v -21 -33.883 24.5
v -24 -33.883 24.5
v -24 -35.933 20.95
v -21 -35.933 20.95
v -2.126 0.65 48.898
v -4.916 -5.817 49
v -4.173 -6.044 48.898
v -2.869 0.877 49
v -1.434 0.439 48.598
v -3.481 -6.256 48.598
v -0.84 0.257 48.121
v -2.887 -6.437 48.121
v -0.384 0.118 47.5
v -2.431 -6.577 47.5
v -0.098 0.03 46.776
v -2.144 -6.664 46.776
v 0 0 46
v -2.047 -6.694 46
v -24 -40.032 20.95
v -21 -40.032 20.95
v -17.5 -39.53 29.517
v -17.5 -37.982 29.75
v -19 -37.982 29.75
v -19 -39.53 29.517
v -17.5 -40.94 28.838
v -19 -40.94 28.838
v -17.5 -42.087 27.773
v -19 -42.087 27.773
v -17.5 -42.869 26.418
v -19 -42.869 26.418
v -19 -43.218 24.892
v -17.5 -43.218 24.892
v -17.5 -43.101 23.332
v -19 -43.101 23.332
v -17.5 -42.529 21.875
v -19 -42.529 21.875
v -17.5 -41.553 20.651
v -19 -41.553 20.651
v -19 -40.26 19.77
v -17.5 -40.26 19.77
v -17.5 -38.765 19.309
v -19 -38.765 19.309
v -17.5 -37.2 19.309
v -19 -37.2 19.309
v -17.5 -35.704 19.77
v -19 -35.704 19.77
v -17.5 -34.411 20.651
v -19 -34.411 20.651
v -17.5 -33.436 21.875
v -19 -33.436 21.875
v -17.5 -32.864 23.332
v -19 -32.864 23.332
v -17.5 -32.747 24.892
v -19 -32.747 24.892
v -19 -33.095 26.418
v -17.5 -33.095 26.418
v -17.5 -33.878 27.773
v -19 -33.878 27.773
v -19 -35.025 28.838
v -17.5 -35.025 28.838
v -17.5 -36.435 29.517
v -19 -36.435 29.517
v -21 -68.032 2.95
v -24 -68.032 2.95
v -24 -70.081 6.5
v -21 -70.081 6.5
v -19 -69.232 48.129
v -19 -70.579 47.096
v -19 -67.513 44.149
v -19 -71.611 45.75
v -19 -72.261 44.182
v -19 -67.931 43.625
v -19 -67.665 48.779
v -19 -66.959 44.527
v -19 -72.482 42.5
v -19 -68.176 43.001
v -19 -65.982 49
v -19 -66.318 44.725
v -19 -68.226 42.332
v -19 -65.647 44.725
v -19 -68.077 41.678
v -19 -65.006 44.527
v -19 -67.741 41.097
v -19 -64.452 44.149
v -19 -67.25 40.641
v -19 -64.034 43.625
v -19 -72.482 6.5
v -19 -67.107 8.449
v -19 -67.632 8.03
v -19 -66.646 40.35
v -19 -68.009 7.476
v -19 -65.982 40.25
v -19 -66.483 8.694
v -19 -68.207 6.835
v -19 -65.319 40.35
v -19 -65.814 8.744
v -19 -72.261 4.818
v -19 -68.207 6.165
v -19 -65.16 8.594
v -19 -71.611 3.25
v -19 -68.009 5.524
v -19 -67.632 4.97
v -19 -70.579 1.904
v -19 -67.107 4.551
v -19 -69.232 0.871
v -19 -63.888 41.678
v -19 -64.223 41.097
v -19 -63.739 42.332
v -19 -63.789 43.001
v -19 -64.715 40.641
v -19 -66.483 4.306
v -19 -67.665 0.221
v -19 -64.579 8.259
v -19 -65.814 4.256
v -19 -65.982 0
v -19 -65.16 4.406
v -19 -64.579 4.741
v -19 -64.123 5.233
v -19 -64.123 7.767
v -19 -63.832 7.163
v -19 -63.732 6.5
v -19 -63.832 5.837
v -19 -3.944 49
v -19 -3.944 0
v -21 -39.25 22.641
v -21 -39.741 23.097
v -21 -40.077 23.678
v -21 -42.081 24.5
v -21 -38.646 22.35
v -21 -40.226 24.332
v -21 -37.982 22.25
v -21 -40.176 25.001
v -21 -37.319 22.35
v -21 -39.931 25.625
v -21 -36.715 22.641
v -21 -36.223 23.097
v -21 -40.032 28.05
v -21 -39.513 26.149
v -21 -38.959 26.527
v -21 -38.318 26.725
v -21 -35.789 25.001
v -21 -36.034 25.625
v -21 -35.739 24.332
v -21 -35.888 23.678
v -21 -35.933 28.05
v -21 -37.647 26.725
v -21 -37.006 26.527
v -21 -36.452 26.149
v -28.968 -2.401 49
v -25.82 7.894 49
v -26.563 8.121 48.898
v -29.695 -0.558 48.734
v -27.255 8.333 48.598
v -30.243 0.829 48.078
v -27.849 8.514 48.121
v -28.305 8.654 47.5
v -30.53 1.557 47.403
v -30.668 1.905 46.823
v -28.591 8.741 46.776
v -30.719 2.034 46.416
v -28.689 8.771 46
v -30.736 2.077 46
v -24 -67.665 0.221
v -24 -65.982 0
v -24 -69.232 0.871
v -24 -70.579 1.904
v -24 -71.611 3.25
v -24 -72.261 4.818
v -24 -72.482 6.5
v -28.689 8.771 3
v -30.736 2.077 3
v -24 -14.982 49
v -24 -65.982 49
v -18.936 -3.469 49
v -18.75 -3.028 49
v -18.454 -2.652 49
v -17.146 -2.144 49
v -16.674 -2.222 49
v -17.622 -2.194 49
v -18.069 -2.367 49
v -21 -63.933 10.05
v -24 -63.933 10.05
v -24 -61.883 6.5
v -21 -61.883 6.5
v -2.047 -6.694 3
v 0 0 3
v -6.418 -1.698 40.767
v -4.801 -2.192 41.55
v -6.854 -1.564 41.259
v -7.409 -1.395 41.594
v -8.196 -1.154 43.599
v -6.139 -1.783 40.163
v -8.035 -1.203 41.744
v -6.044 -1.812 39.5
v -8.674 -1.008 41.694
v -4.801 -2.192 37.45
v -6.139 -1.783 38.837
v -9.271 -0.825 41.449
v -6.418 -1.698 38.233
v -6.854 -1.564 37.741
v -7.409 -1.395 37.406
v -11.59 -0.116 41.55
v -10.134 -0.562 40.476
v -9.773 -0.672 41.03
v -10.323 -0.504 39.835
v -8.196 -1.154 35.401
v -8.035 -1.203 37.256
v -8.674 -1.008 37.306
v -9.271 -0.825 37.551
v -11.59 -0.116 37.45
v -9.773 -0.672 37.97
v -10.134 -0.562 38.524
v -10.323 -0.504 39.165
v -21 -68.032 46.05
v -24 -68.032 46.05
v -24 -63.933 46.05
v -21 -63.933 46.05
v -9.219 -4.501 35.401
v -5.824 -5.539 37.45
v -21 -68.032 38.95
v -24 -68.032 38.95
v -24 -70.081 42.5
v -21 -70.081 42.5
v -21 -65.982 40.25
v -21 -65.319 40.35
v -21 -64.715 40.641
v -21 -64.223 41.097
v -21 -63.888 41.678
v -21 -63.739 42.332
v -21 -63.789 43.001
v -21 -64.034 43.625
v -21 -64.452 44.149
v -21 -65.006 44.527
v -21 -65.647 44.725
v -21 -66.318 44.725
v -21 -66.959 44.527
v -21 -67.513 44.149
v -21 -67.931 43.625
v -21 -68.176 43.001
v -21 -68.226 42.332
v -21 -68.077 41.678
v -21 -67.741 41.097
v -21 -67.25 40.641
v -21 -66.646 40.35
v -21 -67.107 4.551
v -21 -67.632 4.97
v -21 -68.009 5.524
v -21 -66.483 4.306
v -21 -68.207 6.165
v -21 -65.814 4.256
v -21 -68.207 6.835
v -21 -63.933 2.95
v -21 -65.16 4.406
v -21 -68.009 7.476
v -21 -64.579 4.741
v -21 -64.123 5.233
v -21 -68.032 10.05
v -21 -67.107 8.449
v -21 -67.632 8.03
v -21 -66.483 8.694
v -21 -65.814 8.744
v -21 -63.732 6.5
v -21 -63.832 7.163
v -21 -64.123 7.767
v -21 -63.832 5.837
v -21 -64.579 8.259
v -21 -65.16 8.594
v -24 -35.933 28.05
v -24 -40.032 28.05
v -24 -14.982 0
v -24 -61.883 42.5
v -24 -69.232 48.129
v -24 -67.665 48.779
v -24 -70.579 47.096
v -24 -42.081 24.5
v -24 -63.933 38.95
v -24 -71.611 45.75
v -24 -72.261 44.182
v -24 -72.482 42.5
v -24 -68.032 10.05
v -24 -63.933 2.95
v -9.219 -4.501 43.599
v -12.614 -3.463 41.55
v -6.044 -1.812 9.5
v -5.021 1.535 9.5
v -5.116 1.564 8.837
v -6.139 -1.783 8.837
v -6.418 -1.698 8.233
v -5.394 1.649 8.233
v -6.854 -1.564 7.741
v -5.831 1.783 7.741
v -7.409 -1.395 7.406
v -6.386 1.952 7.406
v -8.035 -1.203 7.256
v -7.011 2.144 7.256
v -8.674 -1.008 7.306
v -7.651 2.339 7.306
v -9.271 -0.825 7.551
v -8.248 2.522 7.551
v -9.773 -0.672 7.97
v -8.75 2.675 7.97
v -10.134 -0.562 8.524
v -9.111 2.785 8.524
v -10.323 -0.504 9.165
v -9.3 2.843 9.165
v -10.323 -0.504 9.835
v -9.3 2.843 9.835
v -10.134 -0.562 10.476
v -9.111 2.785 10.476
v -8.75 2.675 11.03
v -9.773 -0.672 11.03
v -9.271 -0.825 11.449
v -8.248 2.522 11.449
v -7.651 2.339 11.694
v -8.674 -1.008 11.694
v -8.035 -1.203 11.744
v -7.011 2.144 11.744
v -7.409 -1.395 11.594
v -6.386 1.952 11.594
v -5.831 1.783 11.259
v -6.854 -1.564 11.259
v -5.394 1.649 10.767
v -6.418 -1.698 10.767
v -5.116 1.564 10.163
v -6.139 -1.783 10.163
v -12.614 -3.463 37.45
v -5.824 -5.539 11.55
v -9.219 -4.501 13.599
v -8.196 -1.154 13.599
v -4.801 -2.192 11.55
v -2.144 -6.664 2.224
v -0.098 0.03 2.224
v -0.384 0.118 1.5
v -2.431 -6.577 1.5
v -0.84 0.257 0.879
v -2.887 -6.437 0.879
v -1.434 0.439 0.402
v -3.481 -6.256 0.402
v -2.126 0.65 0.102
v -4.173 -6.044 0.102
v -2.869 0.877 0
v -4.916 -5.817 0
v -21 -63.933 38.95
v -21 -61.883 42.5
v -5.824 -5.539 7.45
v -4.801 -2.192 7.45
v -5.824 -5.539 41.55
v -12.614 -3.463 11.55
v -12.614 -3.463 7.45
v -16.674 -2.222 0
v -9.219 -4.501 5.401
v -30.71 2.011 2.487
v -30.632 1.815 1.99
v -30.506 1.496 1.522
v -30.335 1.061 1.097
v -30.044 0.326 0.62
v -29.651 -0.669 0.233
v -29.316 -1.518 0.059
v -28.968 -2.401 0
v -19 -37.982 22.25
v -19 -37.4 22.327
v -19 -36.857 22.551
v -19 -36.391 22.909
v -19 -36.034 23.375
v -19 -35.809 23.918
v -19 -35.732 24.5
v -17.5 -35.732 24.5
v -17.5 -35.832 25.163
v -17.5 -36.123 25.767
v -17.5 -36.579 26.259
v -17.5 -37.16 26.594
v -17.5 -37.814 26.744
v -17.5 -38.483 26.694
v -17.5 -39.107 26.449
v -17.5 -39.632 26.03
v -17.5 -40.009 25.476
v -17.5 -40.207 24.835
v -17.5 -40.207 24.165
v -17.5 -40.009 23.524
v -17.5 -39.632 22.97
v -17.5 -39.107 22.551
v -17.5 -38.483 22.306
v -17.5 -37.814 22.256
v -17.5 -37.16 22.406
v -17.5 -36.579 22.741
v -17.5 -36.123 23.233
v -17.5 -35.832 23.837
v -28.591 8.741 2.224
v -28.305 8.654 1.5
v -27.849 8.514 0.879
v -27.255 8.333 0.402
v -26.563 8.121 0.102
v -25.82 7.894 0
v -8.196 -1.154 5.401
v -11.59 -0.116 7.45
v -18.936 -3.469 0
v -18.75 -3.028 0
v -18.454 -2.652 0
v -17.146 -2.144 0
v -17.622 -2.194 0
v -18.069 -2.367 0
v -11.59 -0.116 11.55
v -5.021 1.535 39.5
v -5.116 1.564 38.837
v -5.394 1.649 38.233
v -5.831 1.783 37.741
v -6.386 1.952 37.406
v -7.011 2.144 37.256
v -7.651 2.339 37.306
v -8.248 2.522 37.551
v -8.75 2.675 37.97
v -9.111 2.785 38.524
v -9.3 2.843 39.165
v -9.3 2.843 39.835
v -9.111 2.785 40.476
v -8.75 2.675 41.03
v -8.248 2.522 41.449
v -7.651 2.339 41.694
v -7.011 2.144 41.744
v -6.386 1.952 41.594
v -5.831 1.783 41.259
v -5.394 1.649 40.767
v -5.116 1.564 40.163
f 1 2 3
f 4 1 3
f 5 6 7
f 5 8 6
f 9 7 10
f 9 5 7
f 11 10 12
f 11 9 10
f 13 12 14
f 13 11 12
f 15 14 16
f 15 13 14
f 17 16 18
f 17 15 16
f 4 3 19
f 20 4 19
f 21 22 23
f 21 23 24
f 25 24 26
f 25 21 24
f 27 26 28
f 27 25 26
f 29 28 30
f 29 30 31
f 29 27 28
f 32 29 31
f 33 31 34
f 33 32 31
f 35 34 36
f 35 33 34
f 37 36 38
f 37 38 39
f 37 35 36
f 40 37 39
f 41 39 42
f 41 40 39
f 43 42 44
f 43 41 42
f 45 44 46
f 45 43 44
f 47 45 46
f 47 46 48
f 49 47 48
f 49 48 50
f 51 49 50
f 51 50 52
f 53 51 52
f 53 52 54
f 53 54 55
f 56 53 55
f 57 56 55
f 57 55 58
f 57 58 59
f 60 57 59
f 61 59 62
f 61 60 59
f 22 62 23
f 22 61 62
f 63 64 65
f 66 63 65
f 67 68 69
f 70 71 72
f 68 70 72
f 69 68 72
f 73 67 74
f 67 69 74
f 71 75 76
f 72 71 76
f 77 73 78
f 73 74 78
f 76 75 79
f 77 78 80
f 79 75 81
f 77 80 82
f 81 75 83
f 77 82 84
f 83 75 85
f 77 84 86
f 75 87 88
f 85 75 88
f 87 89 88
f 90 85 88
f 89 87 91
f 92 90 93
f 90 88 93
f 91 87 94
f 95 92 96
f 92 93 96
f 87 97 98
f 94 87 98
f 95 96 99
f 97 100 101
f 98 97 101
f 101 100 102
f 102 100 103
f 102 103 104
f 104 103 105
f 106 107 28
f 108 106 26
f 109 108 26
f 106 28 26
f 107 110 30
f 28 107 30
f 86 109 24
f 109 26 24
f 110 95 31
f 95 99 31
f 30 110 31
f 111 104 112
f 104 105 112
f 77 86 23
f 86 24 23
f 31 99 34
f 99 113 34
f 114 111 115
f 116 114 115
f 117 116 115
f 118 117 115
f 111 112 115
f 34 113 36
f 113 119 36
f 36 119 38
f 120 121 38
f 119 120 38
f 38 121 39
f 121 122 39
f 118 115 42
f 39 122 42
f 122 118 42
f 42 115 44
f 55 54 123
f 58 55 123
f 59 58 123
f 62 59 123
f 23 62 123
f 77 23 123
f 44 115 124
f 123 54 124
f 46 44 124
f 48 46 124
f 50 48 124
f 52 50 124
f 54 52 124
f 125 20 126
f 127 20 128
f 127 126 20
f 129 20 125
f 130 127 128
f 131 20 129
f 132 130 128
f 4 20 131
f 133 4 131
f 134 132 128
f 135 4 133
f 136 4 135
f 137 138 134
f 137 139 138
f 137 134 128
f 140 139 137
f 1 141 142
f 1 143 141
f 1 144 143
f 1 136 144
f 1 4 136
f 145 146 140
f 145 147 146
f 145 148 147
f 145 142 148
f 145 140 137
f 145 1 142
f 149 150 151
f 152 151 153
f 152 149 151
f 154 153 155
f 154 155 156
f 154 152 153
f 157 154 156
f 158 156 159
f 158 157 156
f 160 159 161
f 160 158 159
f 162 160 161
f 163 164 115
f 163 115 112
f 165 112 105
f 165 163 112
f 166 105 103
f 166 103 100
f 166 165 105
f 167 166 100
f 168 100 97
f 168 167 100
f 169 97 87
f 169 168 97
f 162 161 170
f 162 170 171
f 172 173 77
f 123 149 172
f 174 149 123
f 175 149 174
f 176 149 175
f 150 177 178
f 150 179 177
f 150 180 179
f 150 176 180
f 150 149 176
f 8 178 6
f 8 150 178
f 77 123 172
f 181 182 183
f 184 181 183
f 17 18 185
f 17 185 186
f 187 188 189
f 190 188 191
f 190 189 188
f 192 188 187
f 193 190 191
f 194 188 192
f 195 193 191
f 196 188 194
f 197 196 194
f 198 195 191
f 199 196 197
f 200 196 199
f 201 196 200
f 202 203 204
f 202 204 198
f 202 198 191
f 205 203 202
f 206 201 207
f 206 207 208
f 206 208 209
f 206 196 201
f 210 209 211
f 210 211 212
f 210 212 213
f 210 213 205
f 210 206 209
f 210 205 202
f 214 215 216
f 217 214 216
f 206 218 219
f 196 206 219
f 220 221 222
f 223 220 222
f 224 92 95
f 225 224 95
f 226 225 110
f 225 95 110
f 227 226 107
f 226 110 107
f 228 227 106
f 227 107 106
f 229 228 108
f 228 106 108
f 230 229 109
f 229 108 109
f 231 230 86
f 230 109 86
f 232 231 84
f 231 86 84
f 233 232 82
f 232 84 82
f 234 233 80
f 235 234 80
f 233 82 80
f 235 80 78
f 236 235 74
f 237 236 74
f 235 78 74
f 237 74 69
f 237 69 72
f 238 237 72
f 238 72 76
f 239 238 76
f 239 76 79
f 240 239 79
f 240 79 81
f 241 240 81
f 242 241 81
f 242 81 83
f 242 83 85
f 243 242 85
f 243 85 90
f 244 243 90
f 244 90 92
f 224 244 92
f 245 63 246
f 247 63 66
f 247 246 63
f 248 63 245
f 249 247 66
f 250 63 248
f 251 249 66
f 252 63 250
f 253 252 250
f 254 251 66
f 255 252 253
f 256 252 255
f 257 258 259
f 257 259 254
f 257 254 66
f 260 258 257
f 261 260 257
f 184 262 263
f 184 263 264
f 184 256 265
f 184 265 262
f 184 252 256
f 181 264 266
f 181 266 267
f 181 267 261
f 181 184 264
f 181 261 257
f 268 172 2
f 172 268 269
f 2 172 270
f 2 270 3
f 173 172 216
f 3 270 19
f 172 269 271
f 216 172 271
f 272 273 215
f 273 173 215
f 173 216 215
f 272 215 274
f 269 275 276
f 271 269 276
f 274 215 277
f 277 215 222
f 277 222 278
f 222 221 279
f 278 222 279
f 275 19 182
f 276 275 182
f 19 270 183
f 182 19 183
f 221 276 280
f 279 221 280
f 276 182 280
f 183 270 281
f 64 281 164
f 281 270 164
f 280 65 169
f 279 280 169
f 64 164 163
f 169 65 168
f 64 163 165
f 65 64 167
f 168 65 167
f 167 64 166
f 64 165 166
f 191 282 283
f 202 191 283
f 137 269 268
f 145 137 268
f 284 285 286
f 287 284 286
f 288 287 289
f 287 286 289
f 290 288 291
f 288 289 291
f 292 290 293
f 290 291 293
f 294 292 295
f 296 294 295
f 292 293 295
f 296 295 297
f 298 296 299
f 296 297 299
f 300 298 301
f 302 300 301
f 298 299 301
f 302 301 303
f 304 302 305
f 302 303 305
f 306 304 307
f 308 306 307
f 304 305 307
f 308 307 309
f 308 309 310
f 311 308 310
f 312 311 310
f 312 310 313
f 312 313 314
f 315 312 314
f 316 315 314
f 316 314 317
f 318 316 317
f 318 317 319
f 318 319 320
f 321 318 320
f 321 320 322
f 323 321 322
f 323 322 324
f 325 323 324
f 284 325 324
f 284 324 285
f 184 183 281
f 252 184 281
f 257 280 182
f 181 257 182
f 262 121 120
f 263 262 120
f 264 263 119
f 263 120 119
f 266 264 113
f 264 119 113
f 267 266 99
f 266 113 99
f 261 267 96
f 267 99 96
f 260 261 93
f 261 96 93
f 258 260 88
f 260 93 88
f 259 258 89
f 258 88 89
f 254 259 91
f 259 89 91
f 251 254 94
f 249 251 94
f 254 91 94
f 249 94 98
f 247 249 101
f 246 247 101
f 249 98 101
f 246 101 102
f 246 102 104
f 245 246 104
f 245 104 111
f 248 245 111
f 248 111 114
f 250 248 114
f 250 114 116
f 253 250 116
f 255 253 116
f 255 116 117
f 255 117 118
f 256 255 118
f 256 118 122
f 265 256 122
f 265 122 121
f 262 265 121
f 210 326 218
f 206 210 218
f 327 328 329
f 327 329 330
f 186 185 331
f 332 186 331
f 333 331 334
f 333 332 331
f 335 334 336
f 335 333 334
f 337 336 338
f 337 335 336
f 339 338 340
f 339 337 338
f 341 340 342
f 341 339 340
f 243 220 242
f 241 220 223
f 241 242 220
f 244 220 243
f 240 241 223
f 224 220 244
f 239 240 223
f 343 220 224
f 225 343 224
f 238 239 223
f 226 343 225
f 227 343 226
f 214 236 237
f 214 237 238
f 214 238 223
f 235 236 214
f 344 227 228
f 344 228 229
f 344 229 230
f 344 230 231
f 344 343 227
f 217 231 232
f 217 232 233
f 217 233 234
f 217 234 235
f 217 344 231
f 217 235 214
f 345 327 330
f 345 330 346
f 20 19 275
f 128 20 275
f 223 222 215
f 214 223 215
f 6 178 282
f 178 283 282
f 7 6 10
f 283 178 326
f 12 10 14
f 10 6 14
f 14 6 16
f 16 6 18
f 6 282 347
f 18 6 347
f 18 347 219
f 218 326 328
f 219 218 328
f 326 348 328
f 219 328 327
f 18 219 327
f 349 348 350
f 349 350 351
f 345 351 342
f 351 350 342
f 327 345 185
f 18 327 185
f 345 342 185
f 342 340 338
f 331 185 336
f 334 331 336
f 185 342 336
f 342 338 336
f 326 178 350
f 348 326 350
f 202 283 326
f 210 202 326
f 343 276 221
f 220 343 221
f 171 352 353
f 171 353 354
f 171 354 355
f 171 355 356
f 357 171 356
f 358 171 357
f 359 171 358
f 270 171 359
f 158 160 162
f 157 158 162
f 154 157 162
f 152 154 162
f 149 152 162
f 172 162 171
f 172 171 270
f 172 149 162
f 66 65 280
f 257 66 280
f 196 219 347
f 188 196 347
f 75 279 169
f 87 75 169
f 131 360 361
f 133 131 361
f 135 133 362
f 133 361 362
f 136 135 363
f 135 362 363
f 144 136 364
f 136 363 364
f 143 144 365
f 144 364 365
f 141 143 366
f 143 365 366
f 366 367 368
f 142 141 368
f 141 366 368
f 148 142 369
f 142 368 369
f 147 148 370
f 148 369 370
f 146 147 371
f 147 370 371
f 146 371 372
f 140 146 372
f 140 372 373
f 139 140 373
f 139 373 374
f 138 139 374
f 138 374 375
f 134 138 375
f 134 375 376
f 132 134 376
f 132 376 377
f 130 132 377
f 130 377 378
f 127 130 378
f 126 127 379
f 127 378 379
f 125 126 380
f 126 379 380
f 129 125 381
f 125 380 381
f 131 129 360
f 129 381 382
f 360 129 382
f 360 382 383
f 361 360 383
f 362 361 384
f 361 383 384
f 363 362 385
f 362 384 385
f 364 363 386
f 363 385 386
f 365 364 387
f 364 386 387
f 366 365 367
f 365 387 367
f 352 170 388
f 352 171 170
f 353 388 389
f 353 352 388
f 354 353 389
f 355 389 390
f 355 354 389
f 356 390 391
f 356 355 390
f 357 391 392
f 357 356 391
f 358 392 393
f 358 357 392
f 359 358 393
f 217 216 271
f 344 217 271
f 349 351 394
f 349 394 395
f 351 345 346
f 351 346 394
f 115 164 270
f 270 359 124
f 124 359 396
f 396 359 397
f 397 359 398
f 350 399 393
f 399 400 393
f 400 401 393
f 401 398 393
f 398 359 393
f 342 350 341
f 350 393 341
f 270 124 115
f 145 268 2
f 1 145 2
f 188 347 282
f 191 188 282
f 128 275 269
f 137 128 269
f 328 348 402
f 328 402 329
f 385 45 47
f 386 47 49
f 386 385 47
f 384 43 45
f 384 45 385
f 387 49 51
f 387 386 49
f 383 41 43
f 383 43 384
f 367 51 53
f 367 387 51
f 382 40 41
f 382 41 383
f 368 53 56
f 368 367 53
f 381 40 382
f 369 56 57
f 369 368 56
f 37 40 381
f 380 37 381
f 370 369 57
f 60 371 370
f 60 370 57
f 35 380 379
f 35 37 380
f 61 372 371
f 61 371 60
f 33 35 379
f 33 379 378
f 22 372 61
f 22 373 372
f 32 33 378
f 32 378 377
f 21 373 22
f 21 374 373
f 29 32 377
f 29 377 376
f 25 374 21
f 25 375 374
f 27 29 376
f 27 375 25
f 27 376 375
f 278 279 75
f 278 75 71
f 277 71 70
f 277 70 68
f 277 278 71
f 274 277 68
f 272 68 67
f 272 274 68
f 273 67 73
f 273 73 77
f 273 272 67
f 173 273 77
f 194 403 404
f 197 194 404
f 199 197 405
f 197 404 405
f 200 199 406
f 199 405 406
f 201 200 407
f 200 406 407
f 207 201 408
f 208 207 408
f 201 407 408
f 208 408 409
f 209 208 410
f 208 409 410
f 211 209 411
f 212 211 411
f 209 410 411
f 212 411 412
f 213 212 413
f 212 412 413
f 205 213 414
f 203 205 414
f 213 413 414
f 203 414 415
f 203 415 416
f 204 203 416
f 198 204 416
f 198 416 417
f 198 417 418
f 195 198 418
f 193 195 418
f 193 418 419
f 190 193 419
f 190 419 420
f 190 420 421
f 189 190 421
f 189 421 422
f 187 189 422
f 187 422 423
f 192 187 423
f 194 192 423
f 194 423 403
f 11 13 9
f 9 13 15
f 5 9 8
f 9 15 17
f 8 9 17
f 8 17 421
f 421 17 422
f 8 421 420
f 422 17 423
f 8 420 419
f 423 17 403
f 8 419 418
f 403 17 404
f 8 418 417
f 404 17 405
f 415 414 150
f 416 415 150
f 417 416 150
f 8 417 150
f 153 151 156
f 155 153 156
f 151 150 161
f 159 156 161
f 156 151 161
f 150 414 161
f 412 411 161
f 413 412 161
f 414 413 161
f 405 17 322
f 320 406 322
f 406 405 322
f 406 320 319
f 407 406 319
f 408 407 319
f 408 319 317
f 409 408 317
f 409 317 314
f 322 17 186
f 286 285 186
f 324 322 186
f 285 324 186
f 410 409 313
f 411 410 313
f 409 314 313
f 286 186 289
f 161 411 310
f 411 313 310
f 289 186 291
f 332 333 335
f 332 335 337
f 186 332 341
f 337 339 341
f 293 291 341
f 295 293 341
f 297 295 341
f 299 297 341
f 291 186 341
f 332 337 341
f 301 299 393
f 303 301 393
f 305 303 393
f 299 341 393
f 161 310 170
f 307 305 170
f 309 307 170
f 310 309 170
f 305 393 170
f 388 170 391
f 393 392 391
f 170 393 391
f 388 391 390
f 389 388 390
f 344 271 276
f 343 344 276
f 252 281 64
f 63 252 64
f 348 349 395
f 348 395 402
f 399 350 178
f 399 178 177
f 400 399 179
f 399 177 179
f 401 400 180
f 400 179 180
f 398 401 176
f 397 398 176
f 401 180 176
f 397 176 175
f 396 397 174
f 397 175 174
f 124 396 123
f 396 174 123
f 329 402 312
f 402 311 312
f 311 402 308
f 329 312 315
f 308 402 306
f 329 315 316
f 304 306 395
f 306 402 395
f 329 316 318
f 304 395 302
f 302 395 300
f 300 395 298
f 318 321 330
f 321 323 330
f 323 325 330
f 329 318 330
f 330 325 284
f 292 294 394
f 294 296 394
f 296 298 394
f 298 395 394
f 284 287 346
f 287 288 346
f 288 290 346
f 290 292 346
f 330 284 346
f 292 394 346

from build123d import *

# Parameters (mm, degrees)
BOSS_EXTRU_1_DEPTH                  = 49
ENL_V_MAT_EXTRU_1_REACH             = 107.293
ESQUISSE2_R                         = 2.25
ENL_V_MAT_EXTRU_1_DIRECTION_2_DEPTH = 106.292792514
ENL_V_MAT_EXTRU_2_REACH             = 104.484
ESQUISSE3_R                         = 2.25
ENL_V_START                         = -5
ENL_V_MAT_EXTRU_3_DEPTH             = 5
CONG_1_R                            = 3
ENL_V_START_2                       = -7
ENL_V_MAT_EXTRU_4_DEPTH             = 3.5
BOSS_EXTRU_2_DEPTH                  = 49
CONG_2_R                            = 1.8
CONG_3_R                            = 3
ENL_V_MAT_EXTRU_5_DEPTH             = 102.661483921
ENL_V_MAT_EXTRU_5_DEPTH_BACK        = 102.661483921
ESQUISSE8_W                         = 36
ESQUISSE8_H                         = 16
BOSS_EXTRU_3_START                  = 1.5
ESQUISSE9_R                         = 5.25
ESQUISSE9_R_2                       = 2.25
BOSS_EXTRU_3_DEPTH                  = 1.5
ENL_V_MAT_EXTRU_6_DEPTH             = 3


with BuildPart() as part:
    # Esquisse1 → Boss.-Extru.1 (new body)
    with BuildSketch(Plane.XY):
        Polygon((0, 0), (-28.689142679, 8.771151142), (-30.735744612, 2.07701785), (-24, 0.01769406), (-24, -87.98230594), (-19, -87.98230594), (-19, -1.510959348), (-2.046601933, -6.694133292), align=None)
    extrude(amount=BOSS_EXTRU_1_DEPTH)

    # Esquisse2 → Enlèv. mat.-Extru.1 (cut, up to next)
    with BuildSketch(Plane(origin=(0, 0, 0), x_dir=(0.9563047559630374, -0.2923717047227305, 0), z_dir=(0.2923717047227305, 0.9563047559630374, 0)), mode=Mode.PRIVATE) as enl_v_mat_extru_1_sk1:
        with Locations((-7.5, -9.5)):
            Circle(ESQUISSE2_R)
    enl_v_mat_extru_1_tool1 = extrude(enl_v_mat_extru_1_sk1.sketch, amount=-ENL_V_MAT_EXTRU_1_REACH, mode=Mode.PRIVATE) & part.part
    # Esquisse2 → Enlèv. mat.-Extru.1 (cut, up to next)
    with BuildSketch(Plane(origin=(0, 0, 0), x_dir=(0.9563047559630374, -0.2923717047227305, 0), z_dir=(0.2923717047227305, 0.9563047559630374, 0)), mode=Mode.PRIVATE) as enl_v_mat_extru_1_sk2:
        with Locations((-7.5, -39.5)):
            Circle(ESQUISSE2_R)
    enl_v_mat_extru_1_tool2 = extrude(enl_v_mat_extru_1_sk2.sketch, amount=-ENL_V_MAT_EXTRU_1_REACH, mode=Mode.PRIVATE) & part.part
    add(enl_v_mat_extru_1_tool1.solids().sort_by_distance((-7.172286, 2.192788, 9.5))[0], mode=Mode.SUBTRACT)
    add(enl_v_mat_extru_1_tool2.solids().sort_by_distance((-7.172286, 2.192788, 39.5))[0], mode=Mode.SUBTRACT)

    # Esquisse2 → Enlèv. mat.-Extru.1 direction 2 (cut)
    with BuildSketch(Plane(origin=(0, 0, 0), x_dir=(0.9563047559630374, -0.2923717047227305, 0), z_dir=(0.2923717047227305, 0.9563047559630374, 0))):
        with Locations((-7.5, -9.5)):
            Circle(ESQUISSE2_R)
        with Locations((-7.5, -39.5)):
            Circle(ESQUISSE2_R)
    extrude(amount=ENL_V_MAT_EXTRU_1_DIRECTION_2_DEPTH, mode=Mode.SUBTRACT)

    # Esquisse3 → Enlèv. mat.-Extru.2 (cut, up to next)
    with BuildSketch(Plane(origin=(-19, 0, 0), x_dir=(0, 0, -1), z_dir=(1, 0, 0)), mode=Mode.PRIVATE) as enl_v_mat_extru_2_sk1:
        with Locations((-42.5, -65.98230594)):
            Circle(ESQUISSE3_R)
    enl_v_mat_extru_2_tool1 = extrude(enl_v_mat_extru_2_sk1.sketch, amount=-ENL_V_MAT_EXTRU_2_REACH, mode=Mode.PRIVATE) & part.part
    # Esquisse3 → Enlèv. mat.-Extru.2 (cut, up to next)
    with BuildSketch(Plane(origin=(-19, 0, 0), x_dir=(0, 0, -1), z_dir=(1, 0, 0)), mode=Mode.PRIVATE) as enl_v_mat_extru_2_sk2:
        with Locations(Location((-6.5, -65.98230594, 0), (0, 0, 90))):
            Circle(ESQUISSE3_R)
    enl_v_mat_extru_2_tool2 = extrude(enl_v_mat_extru_2_sk2.sketch, amount=-ENL_V_MAT_EXTRU_2_REACH, mode=Mode.PRIVATE) & part.part
    # Esquisse3 → Enlèv. mat.-Extru.2 (cut, up to next)
    with BuildSketch(Plane(origin=(-19, 0, 0), x_dir=(0, 0, -1), z_dir=(1, 0, 0)), mode=Mode.PRIVATE) as enl_v_mat_extru_2_sk3:
        with Locations((-24.5, -37.98230594)):
            Circle(ESQUISSE3_R)
    enl_v_mat_extru_2_tool3 = extrude(enl_v_mat_extru_2_sk3.sketch, amount=-ENL_V_MAT_EXTRU_2_REACH, mode=Mode.PRIVATE) & part.part
    add(enl_v_mat_extru_2_tool1.solids().sort_by_distance((-19, -65.982306, 42.5))[0], mode=Mode.SUBTRACT)
    add(enl_v_mat_extru_2_tool2.solids().sort_by_distance((-19, -65.982306, 6.5))[0], mode=Mode.SUBTRACT)
    add(enl_v_mat_extru_2_tool3.solids().sort_by_distance((-19, -37.982306, 24.5))[0], mode=Mode.SUBTRACT)

    # Esquisse4 → Enlèv. mat.-Extru.3 (cut)
    with BuildSketch(Plane(origin=(-19, 0, 0), x_dir=(0, 0, -1), z_dir=(1, 0, 0)).offset(ENL_V_START)):
        with BuildLine():
            Line((-24.5, -87.98230594), (-42.5, -72.48230594))
            ThreePointArc((-42.5, -72.48230594), (-47.096194078, -70.578500018), (-49, -65.98230594))
            Line((-49, -65.98230594), (-50, -65.98230594))
            Line((-50, -65.98230594), (-50, -88.98230594))
            Line((-50, -88.98230594), (1, -88.98230594))
            Line((1, -88.98230594), (1, -65.98230594))
            Line((1, -65.98230594), (0, -65.98230594))
            ThreePointArc((0, -65.98230594), (-1.903805922, -70.578500018), (-6.5, -72.48230594))
            Line((-6.5, -72.48230594), (-24.5, -87.98230594))
        make_face()
    extrude(amount=ENL_V_MAT_EXTRU_3_DEPTH, mode=Mode.SUBTRACT)

    # Congé1
    cong_1_edges = [part.edges().sort_by_distance(p)[0] for p in [
        (-21.5, -87.98230594, 24.5),
    ]]
    fillet(cong_1_edges, radius=CONG_1_R)

    # Esquisse5 → Enlèv. mat.-Extru.4 (cut)
    with BuildSketch(Plane(origin=(0, 0, 0), x_dir=(0.9563047559630375, -0.2923717047227304, 0), z_dir=(0.2923717047227304, 0.9563047559630375, 0)).offset(ENL_V_START_2)):
        Polygon((-3.95, -11.549593456), (-3.95, -7.450406544), (-7.5, -5.400813089), (-11.05, -7.450406544), (-11.05, -11.549593456), (-7.5, -13.599186911), align=None)
        Polygon((-7.5, -35.400813089), (-3.95, -37.450406544), (-3.95, -41.549593456), (-7.5, -43.599186911), (-11.05, -41.549593456), (-11.05, -37.450406544), align=None)
    extrude(amount=ENL_V_MAT_EXTRU_4_DEPTH, mode=Mode.SUBTRACT)

    # Esquisse6 → Boss.-Extru.2 (add)
    with BuildSketch(Plane.XY.offset(49)):
        Polygon((-30.735744612, 2.07701785), (-24, -14.98230594), (-24, 0.01769406), align=None)
    extrude(amount=-BOSS_EXTRU_2_DEPTH)

    # Congé2
    cong_2_edges = [part.edges().sort_by_distance(p)[0] for p in [
        (-19, -1.510959348, 24.5),
    ]]
    fillet(cong_2_edges, radius=CONG_2_R)

    # Congé3
    cong_3_edges = [part.edges().sort_by_distance(p)[0] for p in [
        (-29.712443645, 5.424084496, 49),
        (-1.023300967, -3.347066646, 0),
        (-1.023300967, -3.347066646, 49),
        (-29.712443645, 5.424084496, 0),
    ]]
    fillet(cong_3_edges, radius=CONG_3_R)

    # Esquisse8 → Enlèv. mat.-Extru.5 (cut, two sides: drawn at the far end of the back side and taken through both)
    with BuildSketch(Plane(origin=(-19, 0, 0), x_dir=(0, 0, -1), z_dir=(1, 0, 0)).offset(-ENL_V_MAT_EXTRU_5_DEPTH_BACK)):
        with Locations((-24.5, -80.48230594)):
            Rectangle(ESQUISSE8_W, ESQUISSE8_H)
    extrude(amount=ENL_V_MAT_EXTRU_5_DEPTH + ENL_V_MAT_EXTRU_5_DEPTH_BACK, mode=Mode.SUBTRACT)

    # Esquisse9 → Boss.-Extru.3 (add)
    with BuildSketch(Plane(origin=(-19, 0, 0), x_dir=(0, 0, -1), z_dir=(1, 0, 0)).offset(BOSS_EXTRU_3_START)):
        with Locations(Location((-24.5, -37.98230594, 0), (0, 0, 180))):
            Circle(ESQUISSE9_R)
        with Locations(Location((-24.5, -37.98230594, 0), (0, 0, 90))):
            Circle(ESQUISSE9_R_2, mode=Mode.SUBTRACT)
    extrude(amount=-BOSS_EXTRU_3_DEPTH)

    # Esquisse10 → Enlèv. mat.-Extru.6 (cut)
    with BuildSketch(Plane.ZY.offset(24)):
        Polygon((28.05, -40.031899396), (28.05, -35.932712485), (24.5, -33.883119029), (20.95, -35.932712485), (20.95, -40.031899396), (24.5, -42.081492852), align=None)
        Polygon((10.05, -68.031899396), (10.05, -63.932712485), (6.5, -61.883119029), (2.95, -63.932712485), (2.95, -68.031899396), (6.5, -70.081492852), align=None)
        Polygon((46.05, -68.031899396), (46.05, -63.932712485), (42.5, -61.883119029), (38.95, -63.932712485), (38.95, -68.031899396), (42.5, -70.081492852), align=None)
    extrude(amount=-ENL_V_MAT_EXTRU_6_DEPTH, mode=Mode.SUBTRACT)


solid = part.part
